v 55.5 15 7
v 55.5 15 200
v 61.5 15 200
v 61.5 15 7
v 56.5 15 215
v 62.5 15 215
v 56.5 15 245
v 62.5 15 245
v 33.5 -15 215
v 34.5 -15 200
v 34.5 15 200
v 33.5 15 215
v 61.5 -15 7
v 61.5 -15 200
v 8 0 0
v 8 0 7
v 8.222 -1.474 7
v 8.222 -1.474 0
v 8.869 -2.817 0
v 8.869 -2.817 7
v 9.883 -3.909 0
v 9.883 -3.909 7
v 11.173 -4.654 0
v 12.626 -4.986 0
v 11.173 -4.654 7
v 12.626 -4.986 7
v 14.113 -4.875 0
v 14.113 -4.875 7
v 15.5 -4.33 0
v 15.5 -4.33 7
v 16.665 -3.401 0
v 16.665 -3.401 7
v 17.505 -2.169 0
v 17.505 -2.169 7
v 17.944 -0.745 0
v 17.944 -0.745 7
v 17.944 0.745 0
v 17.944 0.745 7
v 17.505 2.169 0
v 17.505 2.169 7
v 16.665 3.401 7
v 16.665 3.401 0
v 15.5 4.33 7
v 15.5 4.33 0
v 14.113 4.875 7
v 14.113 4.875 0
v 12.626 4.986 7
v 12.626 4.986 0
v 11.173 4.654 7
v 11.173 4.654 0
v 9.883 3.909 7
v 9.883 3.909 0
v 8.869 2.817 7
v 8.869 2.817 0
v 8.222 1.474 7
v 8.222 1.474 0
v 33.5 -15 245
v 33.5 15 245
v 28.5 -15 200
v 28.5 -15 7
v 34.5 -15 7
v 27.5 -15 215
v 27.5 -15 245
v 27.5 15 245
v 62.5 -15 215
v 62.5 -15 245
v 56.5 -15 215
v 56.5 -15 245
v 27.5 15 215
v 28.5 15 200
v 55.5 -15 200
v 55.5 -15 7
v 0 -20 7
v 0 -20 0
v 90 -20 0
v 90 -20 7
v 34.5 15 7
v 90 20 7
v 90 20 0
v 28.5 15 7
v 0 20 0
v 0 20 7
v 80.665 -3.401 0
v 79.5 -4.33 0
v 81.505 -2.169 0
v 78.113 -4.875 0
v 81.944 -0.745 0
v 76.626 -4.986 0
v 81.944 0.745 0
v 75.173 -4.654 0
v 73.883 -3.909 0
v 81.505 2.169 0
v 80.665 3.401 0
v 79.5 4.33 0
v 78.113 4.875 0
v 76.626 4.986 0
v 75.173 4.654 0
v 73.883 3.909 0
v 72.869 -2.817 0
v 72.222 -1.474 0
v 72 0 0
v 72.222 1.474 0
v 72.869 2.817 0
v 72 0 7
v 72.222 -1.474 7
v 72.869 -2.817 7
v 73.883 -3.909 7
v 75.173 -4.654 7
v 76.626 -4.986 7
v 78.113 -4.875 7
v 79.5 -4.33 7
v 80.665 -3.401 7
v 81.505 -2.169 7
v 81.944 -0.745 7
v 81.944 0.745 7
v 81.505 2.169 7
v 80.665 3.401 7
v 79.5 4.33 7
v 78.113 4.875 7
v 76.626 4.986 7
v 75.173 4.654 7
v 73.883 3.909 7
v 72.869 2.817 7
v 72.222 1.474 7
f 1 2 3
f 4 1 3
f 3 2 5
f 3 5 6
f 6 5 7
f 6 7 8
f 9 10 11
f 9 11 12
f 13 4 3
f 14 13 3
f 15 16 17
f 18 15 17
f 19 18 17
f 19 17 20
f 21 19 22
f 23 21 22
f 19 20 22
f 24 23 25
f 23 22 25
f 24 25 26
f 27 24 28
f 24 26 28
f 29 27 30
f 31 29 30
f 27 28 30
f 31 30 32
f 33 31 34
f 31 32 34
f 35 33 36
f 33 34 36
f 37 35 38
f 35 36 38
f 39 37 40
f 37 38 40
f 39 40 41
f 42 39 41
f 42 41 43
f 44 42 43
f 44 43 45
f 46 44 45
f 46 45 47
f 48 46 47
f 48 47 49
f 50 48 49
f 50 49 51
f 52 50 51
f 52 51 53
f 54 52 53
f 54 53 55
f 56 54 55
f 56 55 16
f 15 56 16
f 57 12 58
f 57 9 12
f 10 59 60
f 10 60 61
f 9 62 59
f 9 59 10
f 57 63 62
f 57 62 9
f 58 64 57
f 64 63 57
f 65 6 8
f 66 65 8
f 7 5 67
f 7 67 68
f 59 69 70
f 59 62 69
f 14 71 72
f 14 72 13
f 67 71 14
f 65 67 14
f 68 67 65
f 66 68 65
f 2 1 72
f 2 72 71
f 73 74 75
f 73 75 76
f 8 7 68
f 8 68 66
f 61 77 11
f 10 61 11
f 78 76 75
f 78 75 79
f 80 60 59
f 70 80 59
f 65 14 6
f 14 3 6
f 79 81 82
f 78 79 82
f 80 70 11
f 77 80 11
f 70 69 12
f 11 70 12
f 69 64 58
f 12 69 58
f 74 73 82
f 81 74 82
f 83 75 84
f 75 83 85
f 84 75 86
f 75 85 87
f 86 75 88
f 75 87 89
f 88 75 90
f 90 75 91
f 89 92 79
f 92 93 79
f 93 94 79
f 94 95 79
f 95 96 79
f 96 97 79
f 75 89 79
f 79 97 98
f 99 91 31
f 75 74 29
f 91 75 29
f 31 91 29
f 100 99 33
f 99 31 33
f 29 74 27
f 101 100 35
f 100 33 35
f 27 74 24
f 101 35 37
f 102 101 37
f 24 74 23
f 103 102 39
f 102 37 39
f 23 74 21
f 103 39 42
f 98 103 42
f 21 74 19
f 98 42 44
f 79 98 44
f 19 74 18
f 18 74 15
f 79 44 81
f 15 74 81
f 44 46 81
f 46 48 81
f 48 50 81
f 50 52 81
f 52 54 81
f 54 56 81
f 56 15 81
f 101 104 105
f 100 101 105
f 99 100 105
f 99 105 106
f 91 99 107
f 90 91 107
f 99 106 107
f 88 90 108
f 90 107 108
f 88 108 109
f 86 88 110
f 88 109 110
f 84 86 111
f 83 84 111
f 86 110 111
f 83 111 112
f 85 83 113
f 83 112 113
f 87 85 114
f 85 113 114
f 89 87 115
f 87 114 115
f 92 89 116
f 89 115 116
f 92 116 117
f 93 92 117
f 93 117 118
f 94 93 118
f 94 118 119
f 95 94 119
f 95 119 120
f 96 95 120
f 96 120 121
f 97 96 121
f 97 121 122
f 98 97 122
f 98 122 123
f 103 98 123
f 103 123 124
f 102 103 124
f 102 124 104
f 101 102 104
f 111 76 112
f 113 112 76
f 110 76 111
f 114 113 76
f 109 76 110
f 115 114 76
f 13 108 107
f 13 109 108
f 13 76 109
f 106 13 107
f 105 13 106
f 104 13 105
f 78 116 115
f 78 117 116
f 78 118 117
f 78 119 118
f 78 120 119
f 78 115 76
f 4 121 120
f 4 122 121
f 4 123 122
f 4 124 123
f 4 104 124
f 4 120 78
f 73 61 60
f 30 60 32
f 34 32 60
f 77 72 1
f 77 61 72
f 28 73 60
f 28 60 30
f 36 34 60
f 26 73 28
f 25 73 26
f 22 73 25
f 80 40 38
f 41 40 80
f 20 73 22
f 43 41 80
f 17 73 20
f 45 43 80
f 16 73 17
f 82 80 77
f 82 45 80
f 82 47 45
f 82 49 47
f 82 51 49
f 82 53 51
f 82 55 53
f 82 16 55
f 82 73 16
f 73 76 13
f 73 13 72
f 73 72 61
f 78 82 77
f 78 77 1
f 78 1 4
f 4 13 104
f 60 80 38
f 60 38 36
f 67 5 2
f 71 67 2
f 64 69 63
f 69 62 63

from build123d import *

# Parameters (mm, degrees)
F0_W     = 40
F0_H     = 7
F1_DEPTH = 90
F4_D     = 10
F5_W     = 6
F5_H     = 30
F5_H_2   = 200
F6_DEPTH = 15
F7_DEPTH = 15


# Not quite as in the source:
# - a feature names something its author has since deleted; it is built from what else it names


with BuildPart() as f1:
    # F0 (on Right) → F1 (new body)
    with BuildSketch(Plane.YZ):
        with Locations((0, 3.5)):
            Rectangle(F0_W, F0_H)
    extrude(amount=F1_DEPTH)

    # F4 (through all)
    with Locations(Plane(origin=(0, 0, 0), x_dir=(1, 0, 0), z_dir=(0, 0, -1))):
        with Locations((13, 0), (77, 0)):
            Hole(F4_D / 2)

    # F5 (on Front) → F6 (join)
    with BuildSketch(Plane.XZ):
        with Locations((59.5, 230)):
            Rectangle(F5_W, F5_H)
        Polygon((56.5, 215), (55.5, 200), (61.5, 200), (62.5, 215), align=None)
        with Locations((58.5, 100)):
            Rectangle(F5_W, F5_H_2)
        with Locations((31.5, 100)):
            Rectangle(F5_W, F5_H_2)
        Polygon((27.5, 215), (28.5, 200), (34.5, 200), (33.5, 215), align=None)
        with Locations((30.5, 230)):
            Rectangle(F5_W, F5_H)
    extrude(amount=F6_DEPTH)

    # F7 (add): faces of the model
    f7_faces = [f1.faces().sort_by_distance(p)[0] for p in [
        (31.3424369748, 0, 126),
        (58.6575630252, 0, 126),
    ]]
    extrude(f7_faces, amount=F7_DEPTH)


solid = f1.part
